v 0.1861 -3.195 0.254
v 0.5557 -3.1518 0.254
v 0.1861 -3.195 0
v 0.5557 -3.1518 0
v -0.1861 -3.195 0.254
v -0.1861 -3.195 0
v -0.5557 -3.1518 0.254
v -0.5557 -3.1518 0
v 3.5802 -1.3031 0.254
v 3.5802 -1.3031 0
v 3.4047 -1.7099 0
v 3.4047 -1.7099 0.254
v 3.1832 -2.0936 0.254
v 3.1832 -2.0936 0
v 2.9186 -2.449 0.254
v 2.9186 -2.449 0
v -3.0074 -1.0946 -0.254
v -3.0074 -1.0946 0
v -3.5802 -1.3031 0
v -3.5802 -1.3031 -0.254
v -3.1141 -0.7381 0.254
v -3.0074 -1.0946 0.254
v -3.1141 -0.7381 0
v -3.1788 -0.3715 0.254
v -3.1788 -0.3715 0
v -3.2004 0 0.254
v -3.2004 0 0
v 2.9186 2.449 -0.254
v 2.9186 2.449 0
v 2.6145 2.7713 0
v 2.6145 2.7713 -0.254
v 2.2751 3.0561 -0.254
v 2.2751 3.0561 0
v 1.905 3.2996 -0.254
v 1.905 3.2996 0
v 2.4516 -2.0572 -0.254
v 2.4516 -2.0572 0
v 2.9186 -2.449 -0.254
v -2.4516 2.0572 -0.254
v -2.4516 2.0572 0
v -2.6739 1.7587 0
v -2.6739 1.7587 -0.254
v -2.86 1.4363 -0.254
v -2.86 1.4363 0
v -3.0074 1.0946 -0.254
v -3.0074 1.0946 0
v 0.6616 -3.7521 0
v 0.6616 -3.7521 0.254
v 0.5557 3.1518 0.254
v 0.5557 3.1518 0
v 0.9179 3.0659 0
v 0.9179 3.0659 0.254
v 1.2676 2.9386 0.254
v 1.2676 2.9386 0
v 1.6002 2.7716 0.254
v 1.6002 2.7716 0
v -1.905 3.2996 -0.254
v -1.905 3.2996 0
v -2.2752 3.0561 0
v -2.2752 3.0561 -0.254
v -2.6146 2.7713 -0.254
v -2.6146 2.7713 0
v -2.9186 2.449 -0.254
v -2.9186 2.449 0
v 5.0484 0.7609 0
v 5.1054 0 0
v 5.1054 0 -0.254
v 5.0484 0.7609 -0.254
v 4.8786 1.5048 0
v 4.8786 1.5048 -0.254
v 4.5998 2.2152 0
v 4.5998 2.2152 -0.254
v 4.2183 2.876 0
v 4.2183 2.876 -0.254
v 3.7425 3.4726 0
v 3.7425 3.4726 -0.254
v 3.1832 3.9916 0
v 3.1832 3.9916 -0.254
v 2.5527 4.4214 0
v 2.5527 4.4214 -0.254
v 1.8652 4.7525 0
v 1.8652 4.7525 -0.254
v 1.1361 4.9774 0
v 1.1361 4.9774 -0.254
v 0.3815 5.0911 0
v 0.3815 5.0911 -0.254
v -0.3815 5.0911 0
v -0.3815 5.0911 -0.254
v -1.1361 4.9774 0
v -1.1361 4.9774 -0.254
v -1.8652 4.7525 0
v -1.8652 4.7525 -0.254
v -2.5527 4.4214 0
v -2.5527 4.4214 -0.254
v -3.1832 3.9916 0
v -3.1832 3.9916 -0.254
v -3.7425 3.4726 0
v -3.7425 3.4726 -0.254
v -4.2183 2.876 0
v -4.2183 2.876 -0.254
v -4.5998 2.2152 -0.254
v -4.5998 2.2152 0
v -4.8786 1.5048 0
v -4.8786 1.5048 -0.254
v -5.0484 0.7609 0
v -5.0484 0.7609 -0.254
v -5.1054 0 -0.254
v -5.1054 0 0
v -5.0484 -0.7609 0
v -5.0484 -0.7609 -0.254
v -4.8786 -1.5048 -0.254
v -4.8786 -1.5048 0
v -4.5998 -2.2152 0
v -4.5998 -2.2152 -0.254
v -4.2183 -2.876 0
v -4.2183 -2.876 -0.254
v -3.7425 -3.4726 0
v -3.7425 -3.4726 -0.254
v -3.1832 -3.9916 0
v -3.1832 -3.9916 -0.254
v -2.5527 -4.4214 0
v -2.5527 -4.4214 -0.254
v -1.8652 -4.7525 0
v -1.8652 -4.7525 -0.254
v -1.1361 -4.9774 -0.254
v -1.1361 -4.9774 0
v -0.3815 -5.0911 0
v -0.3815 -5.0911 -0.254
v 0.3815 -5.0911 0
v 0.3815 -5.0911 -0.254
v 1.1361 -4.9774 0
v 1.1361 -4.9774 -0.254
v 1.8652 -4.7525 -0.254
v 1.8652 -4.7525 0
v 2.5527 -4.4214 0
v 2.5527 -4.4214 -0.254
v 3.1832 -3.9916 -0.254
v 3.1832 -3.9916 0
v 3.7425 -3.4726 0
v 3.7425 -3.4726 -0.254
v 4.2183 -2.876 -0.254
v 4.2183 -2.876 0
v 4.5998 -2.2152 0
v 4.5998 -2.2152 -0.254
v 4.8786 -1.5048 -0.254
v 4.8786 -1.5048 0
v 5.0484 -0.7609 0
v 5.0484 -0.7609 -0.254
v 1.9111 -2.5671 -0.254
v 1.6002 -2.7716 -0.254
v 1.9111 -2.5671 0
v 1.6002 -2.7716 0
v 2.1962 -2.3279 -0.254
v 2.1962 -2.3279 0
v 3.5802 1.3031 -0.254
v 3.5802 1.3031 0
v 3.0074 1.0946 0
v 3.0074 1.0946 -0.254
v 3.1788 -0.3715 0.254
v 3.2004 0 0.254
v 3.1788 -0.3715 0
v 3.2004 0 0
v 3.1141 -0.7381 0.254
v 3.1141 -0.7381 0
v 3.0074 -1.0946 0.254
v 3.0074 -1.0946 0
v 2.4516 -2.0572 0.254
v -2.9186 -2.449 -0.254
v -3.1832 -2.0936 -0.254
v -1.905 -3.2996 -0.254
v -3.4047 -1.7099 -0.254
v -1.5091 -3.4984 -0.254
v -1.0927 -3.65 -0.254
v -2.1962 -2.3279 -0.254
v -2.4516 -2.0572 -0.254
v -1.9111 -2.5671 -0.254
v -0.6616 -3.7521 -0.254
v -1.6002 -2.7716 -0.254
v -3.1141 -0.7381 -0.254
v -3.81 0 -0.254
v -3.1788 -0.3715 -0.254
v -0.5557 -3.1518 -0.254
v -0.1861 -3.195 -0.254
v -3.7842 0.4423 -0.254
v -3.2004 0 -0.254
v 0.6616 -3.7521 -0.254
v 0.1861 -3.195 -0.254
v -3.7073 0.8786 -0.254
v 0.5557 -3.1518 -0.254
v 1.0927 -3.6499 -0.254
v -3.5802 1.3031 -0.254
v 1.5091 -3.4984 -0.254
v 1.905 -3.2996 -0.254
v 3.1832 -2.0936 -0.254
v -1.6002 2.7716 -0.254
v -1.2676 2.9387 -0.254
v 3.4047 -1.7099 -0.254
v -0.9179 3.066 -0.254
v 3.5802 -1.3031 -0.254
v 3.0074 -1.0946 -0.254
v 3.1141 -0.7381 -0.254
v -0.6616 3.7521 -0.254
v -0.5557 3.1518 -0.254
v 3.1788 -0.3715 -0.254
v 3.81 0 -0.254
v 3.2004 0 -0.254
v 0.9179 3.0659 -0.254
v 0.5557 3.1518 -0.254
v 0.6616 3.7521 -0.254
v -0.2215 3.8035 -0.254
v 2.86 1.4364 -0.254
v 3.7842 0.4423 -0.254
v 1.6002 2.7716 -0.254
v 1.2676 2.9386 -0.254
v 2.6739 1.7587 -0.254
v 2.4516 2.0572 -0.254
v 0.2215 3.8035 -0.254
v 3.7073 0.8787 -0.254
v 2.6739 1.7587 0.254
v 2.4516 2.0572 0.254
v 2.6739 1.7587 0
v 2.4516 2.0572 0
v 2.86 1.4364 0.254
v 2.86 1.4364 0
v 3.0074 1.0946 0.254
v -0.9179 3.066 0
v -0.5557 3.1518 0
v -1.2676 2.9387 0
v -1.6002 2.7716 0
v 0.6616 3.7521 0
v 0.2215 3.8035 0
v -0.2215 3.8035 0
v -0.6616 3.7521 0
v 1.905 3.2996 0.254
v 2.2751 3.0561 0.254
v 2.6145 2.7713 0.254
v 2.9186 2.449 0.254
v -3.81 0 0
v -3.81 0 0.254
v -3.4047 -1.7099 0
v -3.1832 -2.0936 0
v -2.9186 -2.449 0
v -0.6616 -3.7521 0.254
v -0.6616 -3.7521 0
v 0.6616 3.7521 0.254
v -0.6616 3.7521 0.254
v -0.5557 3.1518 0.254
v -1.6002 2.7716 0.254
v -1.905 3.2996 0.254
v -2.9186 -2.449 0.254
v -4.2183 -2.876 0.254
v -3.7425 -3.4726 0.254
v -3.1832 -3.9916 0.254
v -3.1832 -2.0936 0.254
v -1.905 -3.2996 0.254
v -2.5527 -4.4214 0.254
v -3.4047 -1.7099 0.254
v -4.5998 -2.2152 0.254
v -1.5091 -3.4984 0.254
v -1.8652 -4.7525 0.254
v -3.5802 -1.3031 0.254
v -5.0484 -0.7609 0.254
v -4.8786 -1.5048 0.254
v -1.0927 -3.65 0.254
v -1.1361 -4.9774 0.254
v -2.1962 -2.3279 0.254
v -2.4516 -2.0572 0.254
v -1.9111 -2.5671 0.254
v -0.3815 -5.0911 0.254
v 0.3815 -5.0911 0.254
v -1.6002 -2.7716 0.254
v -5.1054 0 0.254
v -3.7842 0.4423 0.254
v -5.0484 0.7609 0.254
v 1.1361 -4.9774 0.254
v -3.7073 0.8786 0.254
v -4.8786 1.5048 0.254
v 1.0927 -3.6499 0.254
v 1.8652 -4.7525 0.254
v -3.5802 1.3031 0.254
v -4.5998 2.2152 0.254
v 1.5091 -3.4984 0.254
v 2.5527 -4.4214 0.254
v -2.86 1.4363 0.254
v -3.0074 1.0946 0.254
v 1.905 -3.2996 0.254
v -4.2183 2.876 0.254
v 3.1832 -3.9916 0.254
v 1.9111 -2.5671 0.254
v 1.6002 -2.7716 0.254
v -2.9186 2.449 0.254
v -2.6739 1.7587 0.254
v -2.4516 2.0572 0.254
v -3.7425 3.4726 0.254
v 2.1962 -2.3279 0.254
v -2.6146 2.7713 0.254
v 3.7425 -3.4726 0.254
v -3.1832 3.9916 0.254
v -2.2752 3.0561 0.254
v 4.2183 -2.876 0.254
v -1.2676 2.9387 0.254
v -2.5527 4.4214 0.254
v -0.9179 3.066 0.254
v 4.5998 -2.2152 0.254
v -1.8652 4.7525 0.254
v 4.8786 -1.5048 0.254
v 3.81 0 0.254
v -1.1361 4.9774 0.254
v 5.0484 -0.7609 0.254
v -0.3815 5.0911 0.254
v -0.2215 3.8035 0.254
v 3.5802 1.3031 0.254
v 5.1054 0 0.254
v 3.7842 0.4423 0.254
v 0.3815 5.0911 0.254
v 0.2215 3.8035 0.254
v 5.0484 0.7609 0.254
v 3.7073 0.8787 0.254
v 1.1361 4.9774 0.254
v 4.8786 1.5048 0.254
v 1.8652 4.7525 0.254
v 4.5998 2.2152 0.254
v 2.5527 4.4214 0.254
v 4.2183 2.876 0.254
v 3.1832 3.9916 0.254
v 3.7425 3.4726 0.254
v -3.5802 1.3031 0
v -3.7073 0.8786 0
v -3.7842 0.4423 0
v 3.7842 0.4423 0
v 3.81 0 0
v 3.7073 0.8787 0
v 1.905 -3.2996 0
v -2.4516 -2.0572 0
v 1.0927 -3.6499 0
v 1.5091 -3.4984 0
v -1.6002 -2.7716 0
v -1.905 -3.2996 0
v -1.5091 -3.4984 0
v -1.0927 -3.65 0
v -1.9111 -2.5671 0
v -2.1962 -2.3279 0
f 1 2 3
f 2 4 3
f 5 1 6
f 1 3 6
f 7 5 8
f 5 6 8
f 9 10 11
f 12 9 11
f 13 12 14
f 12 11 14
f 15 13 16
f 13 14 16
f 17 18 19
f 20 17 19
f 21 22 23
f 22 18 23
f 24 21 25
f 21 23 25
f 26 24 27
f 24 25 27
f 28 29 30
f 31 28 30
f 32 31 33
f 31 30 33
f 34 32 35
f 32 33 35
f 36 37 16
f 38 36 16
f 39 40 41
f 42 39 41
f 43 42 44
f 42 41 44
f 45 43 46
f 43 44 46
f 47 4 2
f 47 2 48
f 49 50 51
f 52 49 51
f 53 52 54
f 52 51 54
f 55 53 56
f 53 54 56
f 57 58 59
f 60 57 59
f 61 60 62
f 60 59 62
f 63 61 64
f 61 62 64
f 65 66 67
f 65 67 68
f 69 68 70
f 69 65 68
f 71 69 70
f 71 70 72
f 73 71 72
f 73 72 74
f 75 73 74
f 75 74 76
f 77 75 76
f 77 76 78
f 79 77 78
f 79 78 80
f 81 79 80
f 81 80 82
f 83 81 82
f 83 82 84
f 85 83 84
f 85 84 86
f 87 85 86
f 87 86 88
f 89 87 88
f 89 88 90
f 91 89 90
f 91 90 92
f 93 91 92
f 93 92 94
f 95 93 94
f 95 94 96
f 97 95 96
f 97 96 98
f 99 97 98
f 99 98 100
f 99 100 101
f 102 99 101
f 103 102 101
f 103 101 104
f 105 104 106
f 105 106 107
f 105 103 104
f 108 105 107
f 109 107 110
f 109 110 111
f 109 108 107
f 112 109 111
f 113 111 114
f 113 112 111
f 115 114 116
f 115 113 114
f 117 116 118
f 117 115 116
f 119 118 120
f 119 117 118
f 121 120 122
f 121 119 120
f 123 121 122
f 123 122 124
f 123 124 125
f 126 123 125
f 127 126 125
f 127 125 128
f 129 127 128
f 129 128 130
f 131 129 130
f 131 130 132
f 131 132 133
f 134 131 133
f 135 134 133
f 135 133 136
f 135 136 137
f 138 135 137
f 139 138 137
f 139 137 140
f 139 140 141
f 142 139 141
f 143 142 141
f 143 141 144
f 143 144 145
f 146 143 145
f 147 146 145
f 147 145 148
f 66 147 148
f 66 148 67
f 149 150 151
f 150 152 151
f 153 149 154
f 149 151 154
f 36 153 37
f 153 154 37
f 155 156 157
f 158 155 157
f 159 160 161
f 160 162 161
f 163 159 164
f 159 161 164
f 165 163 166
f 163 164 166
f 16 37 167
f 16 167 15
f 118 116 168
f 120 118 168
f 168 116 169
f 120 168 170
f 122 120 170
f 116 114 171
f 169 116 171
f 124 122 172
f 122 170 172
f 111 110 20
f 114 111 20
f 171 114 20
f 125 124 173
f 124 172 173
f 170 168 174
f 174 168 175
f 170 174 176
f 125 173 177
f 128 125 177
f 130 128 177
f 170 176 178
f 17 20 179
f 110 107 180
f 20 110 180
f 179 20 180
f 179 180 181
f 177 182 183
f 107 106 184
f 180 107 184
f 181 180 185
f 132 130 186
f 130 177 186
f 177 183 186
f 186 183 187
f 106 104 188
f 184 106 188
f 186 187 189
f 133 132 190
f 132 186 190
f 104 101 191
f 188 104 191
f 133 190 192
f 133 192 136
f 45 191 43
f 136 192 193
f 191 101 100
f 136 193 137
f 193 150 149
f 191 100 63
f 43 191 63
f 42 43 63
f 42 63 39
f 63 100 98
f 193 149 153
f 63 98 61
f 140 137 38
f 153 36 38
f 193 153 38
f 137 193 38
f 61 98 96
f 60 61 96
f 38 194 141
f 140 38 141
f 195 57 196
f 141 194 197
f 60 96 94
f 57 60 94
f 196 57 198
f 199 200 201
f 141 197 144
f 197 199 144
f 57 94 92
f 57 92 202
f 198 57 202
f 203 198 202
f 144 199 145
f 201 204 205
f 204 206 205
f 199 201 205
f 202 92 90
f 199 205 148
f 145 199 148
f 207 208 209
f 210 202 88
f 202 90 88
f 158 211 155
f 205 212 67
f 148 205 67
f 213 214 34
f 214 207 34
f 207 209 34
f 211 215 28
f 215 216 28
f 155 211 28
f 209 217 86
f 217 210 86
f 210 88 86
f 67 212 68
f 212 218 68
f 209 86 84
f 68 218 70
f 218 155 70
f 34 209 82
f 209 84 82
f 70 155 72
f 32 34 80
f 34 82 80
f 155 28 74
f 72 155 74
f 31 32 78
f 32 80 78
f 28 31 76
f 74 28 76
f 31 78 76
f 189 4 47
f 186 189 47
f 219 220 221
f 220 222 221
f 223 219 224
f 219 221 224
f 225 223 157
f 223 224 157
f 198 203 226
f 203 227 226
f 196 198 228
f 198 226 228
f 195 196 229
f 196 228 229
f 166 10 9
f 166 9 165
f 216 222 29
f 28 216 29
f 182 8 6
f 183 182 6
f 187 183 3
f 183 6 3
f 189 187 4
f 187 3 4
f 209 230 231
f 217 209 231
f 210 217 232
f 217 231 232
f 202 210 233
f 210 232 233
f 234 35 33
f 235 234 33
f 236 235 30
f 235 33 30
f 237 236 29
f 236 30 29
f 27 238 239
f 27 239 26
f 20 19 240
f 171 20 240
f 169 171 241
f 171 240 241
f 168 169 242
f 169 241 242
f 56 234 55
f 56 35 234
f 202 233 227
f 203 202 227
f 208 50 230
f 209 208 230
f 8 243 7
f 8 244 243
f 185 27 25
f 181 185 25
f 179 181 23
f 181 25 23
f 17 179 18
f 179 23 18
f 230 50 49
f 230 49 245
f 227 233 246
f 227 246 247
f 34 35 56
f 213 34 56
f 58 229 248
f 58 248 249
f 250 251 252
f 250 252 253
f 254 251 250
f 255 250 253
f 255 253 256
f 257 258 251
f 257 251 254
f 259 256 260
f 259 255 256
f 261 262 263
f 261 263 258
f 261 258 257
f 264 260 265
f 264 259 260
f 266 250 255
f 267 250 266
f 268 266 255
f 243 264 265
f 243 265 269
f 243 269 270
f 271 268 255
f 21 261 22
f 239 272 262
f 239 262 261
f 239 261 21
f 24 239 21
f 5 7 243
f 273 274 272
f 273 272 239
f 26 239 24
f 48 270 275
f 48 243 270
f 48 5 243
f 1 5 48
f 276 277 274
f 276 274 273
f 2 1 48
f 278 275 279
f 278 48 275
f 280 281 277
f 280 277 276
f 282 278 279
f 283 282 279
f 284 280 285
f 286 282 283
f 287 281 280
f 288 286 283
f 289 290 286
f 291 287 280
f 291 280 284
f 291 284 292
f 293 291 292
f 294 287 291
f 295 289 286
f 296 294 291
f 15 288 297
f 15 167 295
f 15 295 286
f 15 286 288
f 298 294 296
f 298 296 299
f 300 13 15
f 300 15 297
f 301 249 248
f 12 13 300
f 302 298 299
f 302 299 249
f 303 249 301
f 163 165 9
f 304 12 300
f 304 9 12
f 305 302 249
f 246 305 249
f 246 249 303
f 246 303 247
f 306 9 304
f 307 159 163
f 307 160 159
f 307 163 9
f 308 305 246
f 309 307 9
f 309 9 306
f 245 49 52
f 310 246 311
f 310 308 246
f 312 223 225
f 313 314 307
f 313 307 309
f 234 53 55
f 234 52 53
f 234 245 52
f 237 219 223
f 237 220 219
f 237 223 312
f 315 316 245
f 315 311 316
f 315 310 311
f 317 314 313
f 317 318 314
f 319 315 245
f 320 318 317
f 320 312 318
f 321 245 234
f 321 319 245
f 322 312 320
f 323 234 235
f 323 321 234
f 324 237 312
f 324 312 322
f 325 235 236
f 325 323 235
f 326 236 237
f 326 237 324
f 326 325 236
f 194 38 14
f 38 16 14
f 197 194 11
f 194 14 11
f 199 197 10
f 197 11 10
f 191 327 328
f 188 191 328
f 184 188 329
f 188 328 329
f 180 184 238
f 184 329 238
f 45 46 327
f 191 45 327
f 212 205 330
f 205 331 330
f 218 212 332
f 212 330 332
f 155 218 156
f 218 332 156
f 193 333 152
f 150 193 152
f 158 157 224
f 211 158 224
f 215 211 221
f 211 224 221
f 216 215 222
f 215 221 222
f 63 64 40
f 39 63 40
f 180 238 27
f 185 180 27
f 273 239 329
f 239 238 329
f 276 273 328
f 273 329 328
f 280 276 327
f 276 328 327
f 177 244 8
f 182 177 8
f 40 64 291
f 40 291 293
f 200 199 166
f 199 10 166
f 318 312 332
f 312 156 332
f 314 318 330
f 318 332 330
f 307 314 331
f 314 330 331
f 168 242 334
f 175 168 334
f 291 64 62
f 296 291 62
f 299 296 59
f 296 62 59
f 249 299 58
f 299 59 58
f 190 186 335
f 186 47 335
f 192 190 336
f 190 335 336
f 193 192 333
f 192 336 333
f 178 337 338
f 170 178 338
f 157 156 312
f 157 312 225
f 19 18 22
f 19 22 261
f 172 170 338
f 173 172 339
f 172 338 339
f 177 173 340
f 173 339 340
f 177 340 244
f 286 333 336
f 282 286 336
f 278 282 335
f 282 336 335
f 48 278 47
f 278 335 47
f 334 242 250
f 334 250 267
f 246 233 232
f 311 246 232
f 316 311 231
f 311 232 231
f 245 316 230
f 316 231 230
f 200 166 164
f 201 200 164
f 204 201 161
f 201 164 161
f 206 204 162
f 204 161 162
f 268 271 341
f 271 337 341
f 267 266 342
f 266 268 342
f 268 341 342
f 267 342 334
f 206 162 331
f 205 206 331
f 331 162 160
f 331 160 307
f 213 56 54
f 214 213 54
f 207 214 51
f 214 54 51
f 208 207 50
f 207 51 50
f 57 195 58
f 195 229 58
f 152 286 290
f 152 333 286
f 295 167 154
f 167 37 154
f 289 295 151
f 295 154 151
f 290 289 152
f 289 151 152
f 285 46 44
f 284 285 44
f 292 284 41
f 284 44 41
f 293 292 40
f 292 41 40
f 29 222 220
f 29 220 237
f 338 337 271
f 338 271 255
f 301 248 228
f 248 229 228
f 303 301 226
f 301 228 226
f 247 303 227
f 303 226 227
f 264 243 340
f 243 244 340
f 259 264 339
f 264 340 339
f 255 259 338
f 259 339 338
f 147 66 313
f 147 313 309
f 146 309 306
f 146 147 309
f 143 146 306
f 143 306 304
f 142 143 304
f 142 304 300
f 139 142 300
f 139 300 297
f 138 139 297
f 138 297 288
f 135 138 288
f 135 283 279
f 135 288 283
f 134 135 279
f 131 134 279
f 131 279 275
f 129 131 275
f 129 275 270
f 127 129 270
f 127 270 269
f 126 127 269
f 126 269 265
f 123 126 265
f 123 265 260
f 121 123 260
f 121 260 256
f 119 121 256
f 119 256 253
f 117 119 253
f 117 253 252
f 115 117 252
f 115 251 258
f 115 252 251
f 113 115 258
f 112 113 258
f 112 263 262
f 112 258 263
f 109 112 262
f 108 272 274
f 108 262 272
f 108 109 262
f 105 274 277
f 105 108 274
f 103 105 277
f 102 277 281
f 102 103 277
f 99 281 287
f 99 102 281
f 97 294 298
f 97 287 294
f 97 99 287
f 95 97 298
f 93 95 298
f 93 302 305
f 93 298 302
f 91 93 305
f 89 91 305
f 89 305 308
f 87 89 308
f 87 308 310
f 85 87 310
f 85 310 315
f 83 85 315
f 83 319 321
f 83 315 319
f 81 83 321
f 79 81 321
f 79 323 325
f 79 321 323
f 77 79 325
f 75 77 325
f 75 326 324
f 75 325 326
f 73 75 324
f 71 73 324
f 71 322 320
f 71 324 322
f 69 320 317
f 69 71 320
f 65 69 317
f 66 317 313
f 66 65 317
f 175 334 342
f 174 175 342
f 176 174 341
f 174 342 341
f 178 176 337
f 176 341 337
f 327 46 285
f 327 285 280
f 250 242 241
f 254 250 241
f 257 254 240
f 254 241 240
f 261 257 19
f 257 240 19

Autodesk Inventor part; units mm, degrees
sketch "Sketch_2" plane through (0, 0, 0) normal (0, 0, 1) x (1, 0, 0)
  circle A0 centre (0, 0) radius 5.1054
  line L0 (-3.81, 0) -> (-3.2004, 0)
  arc A1 (-3.2004, 0) -> (-3.0074, -1.0946) centre (0, 0) ccw
  line L1 (-3.0074, -1.0946) -> (-3.5802, -1.3031)
  arc A2 (-3.5802, -1.3031) -> (-2.9186, -2.449) centre (0, 0) ccw
  line L2 (-2.9186, -2.449) -> (-2.4516, -2.0572)
  arc A3 (-2.4516, -2.0572) -> (-1.6002, -2.7716) centre (0, 0) ccw
  line L3 (-1.6002, -2.7716) -> (-1.905, -3.2996)
  arc A4 (-1.905, -3.2996) -> (-0.6616, -3.7521) centre (0, 0) ccw
  line L4 (-0.6616, -3.7521) -> (-0.5557, -3.1518)
  arc A5 (-0.5557, -3.1518) -> (0.5557, -3.1518) centre (0, 0) ccw
  line L5 (0.5557, -3.1518) -> (0.6616, -3.7521)
  arc A6 (0.6616, -3.7521) -> (1.905, -3.2996) centre (0, 0) ccw
  line L6 (1.905, -3.2996) -> (1.6002, -2.7716)
  arc A7 (1.6002, -2.7716) -> (2.4516, -2.0572) centre (0, 0) ccw
  line L7 (2.4516, -2.0572) -> (2.9186, -2.449)
  arc A8 (2.9186, -2.449) -> (3.5802, -1.3031) centre (0, 0) ccw
  line L8 (3.5802, -1.3031) -> (3.0074, -1.0946)
  arc A9 (3.0074, -1.0946) -> (3.2004, 0) centre (0, 0) ccw
  line L9 (3.2004, 0) -> (3.81, 0)
  arc A10 (3.81, 0) -> (3.5802, 1.3031) centre (0, 0) ccw
  line L10 (3.5802, 1.3031) -> (3.0074, 1.0946)
  arc A11 (3.0074, 1.0946) -> (2.4516, 2.0572) centre (0, 0) ccw
  line L11 (2.4516, 2.0572) -> (2.9186, 2.449)
  arc A12 (2.9186, 2.449) -> (1.905, 3.2996) centre (0, 0) ccw
  line L12 (1.905, 3.2996) -> (1.6002, 2.7716)
  arc A13 (1.6002, 2.7716) -> (0.5557, 3.1518) centre (0, 0) ccw
  line L13 (0.5557, 3.1518) -> (0.6616, 3.7521)
  arc A14 (0.6616, 3.7521) -> (-0.6616, 3.7521) centre (0, 0) ccw
  line L14 (-0.6616, 3.7521) -> (-0.5557, 3.1518)
  arc A15 (-0.5557, 3.1518) -> (-1.6002, 2.7716) centre (0, 0) ccw
  line L15 (-1.6002, 2.7716) -> (-1.905, 3.2996)
  arc A16 (-1.905, 3.2996) -> (-2.9186, 2.449) centre (0, 0) ccw
  line L16 (-2.9186, 2.449) -> (-2.4516, 2.0572)
  arc A17 (-2.4516, 2.0572) -> (-3.0074, 1.0946) centre (0, 0) ccw
  line L17 (-3.0074, 1.0946) -> (-3.5802, 1.3031)
  arc A18 (-3.5802, 1.3031) -> (-3.81, 0) centre (0, 0) ccw
extrude "Extrusion1" add sketch "Sketch_2" along normal mid plane 0.508
ref_plane "lockwasher_XY" through (0, 0, 0.254) normal (0, 0, 1) x (1, 0, 0)
ref_plane "lockwasher_YZ" through (0, 0, 0.254) normal (1, 0, 0) x (0, 1, 0)
ref_plane "lockwasher_ZX" through (0, 0, 0.254) normal (0, 1, 0) x (0, 0, 1)
properties part number "AT509"
